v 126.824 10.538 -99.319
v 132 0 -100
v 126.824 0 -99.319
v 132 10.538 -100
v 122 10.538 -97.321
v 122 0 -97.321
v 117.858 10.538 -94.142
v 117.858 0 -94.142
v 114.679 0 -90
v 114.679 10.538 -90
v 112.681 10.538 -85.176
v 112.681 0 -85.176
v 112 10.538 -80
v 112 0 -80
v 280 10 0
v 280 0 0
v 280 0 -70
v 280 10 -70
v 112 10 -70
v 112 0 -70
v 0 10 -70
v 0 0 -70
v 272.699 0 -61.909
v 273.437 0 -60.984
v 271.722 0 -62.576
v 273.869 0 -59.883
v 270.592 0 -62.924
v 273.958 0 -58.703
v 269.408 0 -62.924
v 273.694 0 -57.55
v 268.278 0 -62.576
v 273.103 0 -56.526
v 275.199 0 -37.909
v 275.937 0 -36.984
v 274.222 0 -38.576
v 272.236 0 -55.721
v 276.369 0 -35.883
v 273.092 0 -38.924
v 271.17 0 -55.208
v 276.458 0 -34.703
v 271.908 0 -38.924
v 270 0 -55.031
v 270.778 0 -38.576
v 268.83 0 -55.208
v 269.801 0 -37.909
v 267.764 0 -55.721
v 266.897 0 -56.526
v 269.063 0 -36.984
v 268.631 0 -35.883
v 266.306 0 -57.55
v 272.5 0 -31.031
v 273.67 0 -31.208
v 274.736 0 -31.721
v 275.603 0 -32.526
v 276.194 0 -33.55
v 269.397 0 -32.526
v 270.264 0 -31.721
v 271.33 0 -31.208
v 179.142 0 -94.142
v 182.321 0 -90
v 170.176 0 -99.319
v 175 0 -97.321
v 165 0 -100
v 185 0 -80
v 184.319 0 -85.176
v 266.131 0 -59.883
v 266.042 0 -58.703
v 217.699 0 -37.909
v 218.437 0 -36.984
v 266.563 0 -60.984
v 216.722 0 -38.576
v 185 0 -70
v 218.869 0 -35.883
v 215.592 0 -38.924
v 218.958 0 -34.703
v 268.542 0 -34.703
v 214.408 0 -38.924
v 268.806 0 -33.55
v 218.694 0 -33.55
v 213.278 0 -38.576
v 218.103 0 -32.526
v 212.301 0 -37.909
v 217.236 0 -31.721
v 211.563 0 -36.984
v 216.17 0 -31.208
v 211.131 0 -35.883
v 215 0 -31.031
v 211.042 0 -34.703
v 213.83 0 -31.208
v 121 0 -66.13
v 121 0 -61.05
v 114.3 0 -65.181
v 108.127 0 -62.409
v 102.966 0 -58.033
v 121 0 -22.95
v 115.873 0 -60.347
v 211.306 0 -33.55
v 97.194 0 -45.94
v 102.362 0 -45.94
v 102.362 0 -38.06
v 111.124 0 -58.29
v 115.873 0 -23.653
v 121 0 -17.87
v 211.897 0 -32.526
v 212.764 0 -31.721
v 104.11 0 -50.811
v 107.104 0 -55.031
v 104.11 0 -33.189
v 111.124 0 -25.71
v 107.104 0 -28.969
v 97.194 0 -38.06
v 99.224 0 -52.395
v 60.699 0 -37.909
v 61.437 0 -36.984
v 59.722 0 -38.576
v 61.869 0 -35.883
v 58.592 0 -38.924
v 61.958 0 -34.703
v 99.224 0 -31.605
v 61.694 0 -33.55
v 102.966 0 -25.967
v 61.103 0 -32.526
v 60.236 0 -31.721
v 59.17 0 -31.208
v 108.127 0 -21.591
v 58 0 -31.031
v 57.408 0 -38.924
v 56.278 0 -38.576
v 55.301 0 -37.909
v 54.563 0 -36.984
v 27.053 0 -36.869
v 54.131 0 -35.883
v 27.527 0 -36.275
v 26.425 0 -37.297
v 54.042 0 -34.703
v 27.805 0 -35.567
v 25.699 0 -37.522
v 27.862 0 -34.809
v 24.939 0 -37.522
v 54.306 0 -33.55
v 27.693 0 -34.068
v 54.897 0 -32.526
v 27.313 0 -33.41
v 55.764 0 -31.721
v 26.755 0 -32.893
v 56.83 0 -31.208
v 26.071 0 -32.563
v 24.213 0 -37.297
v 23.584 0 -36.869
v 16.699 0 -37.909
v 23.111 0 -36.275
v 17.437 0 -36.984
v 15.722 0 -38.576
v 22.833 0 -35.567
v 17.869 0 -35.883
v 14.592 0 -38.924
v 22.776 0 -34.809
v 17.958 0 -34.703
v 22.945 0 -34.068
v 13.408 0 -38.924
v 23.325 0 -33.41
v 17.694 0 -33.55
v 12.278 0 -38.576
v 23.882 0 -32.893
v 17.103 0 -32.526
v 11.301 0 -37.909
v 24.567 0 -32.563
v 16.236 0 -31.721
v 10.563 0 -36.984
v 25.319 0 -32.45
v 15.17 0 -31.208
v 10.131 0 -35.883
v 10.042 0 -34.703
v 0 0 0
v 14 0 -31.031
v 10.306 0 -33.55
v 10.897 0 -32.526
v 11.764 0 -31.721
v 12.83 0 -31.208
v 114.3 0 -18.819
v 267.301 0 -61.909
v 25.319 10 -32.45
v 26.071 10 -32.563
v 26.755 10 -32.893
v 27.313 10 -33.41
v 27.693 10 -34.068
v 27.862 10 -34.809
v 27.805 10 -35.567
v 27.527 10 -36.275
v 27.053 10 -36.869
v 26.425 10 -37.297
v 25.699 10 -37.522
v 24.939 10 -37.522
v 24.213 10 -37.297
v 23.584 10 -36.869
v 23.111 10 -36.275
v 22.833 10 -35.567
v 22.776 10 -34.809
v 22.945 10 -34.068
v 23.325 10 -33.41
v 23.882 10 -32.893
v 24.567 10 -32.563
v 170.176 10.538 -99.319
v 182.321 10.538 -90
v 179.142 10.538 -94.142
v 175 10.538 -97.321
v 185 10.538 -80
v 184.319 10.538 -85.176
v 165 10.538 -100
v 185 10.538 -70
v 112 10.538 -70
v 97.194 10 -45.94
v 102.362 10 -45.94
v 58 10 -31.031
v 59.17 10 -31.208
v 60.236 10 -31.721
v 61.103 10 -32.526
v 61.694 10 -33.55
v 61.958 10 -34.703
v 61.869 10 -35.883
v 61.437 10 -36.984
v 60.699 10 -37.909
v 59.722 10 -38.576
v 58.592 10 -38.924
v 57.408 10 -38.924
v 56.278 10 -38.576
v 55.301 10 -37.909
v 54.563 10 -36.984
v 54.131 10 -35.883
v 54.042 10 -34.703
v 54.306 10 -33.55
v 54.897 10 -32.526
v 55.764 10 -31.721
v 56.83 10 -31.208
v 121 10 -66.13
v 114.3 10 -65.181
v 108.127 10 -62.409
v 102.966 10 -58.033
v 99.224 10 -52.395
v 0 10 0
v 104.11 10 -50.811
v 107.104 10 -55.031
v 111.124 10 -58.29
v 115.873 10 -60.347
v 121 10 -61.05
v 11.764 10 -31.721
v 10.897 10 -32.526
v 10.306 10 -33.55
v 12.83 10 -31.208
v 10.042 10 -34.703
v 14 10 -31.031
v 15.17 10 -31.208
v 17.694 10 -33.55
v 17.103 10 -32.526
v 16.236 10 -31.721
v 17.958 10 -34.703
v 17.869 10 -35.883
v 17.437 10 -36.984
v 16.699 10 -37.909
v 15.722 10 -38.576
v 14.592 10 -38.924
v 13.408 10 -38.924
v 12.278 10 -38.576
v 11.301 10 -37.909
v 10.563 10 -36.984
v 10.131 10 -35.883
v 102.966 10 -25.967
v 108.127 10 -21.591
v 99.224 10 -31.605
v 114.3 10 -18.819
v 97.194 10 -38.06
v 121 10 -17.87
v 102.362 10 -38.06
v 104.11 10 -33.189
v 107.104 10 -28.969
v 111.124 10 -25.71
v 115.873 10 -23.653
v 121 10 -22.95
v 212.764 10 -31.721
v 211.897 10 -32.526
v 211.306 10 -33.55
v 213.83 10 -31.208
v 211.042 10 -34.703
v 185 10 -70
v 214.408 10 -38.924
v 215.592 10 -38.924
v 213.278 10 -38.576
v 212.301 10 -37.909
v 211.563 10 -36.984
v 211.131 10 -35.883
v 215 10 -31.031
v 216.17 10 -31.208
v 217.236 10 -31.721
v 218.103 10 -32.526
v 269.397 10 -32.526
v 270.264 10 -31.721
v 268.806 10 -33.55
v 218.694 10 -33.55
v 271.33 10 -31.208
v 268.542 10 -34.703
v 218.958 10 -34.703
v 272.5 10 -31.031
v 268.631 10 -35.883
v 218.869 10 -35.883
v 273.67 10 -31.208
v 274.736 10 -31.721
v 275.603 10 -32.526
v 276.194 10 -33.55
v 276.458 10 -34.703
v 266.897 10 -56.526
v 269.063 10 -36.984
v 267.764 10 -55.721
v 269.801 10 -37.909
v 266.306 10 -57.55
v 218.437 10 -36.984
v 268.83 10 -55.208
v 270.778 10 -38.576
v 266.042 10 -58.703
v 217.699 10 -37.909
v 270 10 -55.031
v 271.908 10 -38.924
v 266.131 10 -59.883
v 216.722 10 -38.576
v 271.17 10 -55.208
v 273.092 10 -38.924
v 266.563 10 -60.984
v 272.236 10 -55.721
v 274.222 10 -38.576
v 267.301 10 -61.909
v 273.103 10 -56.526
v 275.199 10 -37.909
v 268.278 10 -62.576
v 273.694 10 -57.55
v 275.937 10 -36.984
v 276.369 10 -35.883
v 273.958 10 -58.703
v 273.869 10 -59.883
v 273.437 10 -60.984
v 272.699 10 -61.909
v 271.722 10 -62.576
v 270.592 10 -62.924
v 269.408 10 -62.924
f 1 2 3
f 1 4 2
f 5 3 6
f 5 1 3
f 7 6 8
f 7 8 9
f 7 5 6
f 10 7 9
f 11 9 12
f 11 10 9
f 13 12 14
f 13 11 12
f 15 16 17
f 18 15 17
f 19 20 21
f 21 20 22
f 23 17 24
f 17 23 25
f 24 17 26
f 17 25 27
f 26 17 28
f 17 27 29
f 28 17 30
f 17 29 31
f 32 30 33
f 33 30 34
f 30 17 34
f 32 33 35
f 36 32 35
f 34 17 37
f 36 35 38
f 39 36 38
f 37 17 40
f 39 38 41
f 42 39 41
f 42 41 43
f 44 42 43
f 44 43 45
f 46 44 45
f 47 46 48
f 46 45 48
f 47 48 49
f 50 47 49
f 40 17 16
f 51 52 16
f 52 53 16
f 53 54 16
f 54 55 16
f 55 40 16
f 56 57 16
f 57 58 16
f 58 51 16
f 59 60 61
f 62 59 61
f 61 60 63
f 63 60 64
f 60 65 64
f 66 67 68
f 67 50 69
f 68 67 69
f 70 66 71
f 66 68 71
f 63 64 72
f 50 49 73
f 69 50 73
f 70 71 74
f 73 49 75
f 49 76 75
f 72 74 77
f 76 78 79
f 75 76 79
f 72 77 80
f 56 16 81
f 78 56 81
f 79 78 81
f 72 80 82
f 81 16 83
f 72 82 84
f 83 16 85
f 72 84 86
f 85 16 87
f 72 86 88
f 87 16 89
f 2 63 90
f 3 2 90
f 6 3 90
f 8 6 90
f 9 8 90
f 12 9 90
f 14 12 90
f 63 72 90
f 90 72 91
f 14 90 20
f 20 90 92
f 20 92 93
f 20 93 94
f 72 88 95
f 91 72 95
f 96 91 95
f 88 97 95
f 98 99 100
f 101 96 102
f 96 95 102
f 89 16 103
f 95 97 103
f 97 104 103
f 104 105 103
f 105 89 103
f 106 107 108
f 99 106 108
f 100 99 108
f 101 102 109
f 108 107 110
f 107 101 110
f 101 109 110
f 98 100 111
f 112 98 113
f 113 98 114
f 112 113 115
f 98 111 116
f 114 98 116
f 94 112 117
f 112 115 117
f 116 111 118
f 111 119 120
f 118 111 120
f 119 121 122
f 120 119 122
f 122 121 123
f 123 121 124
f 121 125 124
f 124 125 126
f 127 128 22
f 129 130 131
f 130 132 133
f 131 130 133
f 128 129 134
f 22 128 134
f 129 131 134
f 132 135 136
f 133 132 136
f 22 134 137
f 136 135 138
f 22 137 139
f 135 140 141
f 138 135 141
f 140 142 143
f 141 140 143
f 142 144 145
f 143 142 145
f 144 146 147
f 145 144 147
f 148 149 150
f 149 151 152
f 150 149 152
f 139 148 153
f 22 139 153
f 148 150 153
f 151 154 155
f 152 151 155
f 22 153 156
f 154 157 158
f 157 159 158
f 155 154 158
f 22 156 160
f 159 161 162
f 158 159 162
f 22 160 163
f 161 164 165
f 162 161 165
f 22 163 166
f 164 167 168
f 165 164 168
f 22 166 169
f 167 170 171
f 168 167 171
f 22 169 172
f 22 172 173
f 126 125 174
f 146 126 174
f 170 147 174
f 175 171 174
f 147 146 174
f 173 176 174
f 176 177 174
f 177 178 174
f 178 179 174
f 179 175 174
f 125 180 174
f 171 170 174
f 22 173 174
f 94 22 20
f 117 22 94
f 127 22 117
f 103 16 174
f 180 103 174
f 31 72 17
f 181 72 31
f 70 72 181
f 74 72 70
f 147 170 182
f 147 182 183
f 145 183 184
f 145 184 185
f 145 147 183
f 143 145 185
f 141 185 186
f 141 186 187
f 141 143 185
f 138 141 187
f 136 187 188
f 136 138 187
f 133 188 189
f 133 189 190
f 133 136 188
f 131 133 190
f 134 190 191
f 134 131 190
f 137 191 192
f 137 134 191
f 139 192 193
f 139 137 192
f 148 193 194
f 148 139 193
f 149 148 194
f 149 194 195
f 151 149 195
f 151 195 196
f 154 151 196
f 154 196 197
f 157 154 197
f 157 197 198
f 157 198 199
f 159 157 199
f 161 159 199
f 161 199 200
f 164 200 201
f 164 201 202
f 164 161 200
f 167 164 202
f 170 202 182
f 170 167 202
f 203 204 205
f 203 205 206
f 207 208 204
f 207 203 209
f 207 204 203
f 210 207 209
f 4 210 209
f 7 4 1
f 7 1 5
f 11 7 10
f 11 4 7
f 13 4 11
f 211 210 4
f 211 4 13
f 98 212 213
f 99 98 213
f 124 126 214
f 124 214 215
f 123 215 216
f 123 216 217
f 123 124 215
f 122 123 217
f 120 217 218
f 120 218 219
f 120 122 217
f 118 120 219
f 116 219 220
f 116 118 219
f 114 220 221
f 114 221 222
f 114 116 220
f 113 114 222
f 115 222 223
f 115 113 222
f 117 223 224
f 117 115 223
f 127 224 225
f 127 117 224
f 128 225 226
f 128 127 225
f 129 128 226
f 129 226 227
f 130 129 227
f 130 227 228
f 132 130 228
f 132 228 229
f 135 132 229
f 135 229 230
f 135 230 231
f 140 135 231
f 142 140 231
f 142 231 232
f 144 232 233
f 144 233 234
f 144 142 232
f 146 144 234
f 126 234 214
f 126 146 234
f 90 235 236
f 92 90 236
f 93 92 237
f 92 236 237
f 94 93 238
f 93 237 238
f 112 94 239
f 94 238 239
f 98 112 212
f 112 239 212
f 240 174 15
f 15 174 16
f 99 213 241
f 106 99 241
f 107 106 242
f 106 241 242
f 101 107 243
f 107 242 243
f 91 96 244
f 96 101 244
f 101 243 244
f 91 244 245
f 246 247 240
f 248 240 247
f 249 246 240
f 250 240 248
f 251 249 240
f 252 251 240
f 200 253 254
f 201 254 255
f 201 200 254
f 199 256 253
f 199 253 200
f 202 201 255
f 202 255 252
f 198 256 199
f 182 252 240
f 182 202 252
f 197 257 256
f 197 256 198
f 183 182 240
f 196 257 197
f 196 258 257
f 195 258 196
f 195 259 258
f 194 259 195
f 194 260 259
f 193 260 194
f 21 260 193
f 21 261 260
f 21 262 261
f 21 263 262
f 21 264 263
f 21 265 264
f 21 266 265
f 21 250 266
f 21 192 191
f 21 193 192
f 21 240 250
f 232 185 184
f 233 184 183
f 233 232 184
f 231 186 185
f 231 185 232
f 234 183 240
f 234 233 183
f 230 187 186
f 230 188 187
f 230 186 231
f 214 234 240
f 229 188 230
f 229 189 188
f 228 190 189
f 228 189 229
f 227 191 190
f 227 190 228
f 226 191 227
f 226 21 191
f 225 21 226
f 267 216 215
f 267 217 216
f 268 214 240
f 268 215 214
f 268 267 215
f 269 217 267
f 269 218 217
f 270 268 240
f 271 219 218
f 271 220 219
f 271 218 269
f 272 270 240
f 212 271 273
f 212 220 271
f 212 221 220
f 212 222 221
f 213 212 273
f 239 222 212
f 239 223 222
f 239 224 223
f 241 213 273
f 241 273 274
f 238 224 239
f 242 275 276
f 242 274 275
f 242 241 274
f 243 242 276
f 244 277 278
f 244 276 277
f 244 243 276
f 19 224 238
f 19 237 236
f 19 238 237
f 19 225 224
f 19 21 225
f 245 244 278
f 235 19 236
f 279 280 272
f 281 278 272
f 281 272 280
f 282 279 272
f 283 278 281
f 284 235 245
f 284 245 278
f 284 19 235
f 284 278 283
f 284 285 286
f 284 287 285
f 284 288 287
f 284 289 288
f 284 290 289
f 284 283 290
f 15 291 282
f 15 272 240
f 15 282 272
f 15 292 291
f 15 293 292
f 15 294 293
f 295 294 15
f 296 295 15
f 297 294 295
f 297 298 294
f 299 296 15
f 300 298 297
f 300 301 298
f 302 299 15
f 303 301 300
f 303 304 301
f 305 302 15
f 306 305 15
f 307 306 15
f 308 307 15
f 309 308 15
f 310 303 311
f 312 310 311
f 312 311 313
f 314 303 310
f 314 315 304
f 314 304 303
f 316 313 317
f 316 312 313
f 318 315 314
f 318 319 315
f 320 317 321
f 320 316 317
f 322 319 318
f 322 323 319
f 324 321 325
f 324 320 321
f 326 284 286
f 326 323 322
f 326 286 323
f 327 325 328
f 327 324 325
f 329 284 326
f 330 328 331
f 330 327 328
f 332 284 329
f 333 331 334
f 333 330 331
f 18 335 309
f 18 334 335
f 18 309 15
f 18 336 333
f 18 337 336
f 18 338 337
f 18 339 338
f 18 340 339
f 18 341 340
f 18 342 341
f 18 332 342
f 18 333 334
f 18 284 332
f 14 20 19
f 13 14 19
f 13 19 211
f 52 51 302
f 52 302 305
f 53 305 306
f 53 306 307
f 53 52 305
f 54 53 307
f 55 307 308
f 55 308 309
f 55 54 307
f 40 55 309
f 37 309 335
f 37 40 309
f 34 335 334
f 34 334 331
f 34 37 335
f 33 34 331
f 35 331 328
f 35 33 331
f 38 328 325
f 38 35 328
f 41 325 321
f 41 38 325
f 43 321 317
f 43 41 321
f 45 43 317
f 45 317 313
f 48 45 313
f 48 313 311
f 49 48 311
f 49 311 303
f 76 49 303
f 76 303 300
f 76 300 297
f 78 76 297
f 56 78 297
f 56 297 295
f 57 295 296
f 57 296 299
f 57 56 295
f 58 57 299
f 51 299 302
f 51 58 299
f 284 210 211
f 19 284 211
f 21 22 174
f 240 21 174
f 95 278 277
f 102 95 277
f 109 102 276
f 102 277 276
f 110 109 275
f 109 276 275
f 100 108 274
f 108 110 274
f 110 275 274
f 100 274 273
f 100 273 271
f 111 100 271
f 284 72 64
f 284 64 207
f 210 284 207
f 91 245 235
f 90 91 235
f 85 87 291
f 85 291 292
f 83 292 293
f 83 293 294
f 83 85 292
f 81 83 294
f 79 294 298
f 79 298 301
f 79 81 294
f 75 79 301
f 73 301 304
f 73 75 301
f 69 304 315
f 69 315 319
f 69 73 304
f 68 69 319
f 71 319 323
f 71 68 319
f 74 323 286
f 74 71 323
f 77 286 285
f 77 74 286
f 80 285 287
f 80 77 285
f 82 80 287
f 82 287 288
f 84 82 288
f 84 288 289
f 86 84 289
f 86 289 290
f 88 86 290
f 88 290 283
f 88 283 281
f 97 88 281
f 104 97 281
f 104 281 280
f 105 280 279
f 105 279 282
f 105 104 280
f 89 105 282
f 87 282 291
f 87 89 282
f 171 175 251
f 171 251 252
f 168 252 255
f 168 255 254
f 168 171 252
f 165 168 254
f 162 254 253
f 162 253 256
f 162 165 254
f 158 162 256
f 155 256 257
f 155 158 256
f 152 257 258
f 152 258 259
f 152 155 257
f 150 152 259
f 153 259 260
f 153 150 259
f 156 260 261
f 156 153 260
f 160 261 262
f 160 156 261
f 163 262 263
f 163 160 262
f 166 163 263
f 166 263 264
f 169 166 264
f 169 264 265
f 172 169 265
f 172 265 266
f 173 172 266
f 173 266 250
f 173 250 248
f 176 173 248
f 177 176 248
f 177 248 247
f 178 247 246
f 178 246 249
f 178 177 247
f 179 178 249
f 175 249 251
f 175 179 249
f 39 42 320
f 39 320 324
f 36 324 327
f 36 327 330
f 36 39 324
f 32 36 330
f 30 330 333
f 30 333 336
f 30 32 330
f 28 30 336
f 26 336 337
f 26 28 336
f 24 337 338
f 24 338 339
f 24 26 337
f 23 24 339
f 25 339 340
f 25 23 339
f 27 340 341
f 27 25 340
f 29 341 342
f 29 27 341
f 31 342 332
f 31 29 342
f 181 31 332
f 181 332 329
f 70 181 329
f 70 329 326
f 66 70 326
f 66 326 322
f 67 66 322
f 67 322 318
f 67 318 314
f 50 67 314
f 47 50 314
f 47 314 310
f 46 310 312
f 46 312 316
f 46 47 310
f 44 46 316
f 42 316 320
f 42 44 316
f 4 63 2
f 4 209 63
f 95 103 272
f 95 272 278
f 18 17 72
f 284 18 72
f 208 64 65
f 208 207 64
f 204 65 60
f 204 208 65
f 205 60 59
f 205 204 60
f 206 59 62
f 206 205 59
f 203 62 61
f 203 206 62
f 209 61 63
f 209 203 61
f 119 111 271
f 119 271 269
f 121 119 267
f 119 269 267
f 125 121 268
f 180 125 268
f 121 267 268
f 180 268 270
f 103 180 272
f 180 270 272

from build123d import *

# Parameters (mm, degrees)
SKETCH1_W           = 280
SKETCH1_H           = 70
SKETCH1_R           = 3.96875
SKETCH1_R_2         = 2.55
BOSS_EXTRUDE7_DEPTH = 10
SKETCH2_W           = 73
SKETCH2_H           = 10.538321467
BOSS_EXTRUDE8_DEPTH = 30
FILLET3_R           = 20
FILLET4_R           = 20
CUT_EXTRUDE1_DEPTH  = 298.489495613
CUT_EXTRUDE2_DEPTH  = 298.489495613


with BuildPart() as part:
    # Sketch1 → Boss-Extrude7 (new body)
    with BuildSketch(Plane(origin=(0, 0, 0), x_dir=(1, 0, 0), z_dir=(0, 1, 0))):
        with Locations((140, 35)):
            Rectangle(SKETCH1_W, SKETCH1_H)
        with Locations((14, 35)):
            Circle(SKETCH1_R, mode=Mode.SUBTRACT)
        with Locations((25.318924397, 35)):
            Circle(SKETCH1_R_2, mode=Mode.SUBTRACT)
        with Locations((58, 35)):
            Circle(SKETCH1_R, mode=Mode.SUBTRACT)
        with Locations((215, 35)):
            Circle(SKETCH1_R, mode=Mode.SUBTRACT)
        with Locations((272.5, 35)):
            Circle(SKETCH1_R, mode=Mode.SUBTRACT)
        with Locations((270, 59)):
            Circle(SKETCH1_R, mode=Mode.SUBTRACT)
    extrude(amount=BOSS_EXTRUDE7_DEPTH)

    # Sketch2 → Boss-Extrude8 (add)
    with BuildSketch(Plane(origin=(0, 0, -70), x_dir=(-1, 0, 0), z_dir=(0, 0, -1))):
        with Locations((-148.5, 5.269160734)):
            Rectangle(SKETCH2_W, SKETCH2_H)
    extrude(amount=BOSS_EXTRUDE8_DEPTH)

    # Fillet3
    fillet3_edges = [part.edges().sort_by_distance(p)[0] for p in [
        (185, 5.269160734, -100),
    ]]
    fillet(fillet3_edges, radius=FILLET3_R)

    # Fillet4
    fillet4_edges = [part.edges().sort_by_distance(p)[0] for p in [
        (112, 5.269160734, -100),
    ]]
    fillet(fillet4_edges, radius=FILLET4_R)

    # Sketch3 → Cut-Extrude1 (cut, through all)
    with BuildSketch(Plane(origin=(0, 10, 0), x_dir=(1, 0, 0), z_dir=(0, 1, 0))):
        with BuildLine():
            Line((121, 61.05), (121, 66.13))
            ThreePointArc((121, 66.13), (105.392513422, 60.402805839), (97.193821375, 45.939893305))
            Line((97.193821375, 45.939893305), (102.361874001, 45.939893305))
            ThreePointArc((102.361874001, 45.939893305), (109.003176826, 56.797930049), (121, 61.05))
        make_face()
    extrude(amount=-CUT_EXTRUDE1_DEPTH, mode=Mode.SUBTRACT)

    # Sketch3<3> → Cut-Extrude2 (cut, through all)
    with BuildSketch(Plane(origin=(0, 10, 0), x_dir=(1, 0, 0), z_dir=(0, 1, 0))):
        with BuildLine():
            Line((121, 17.87), (121, 22.95))
            ThreePointArc((121, 22.95), (109.003176826, 27.202069951), (102.361874001, 38.060106695))
            Line((102.361874001, 38.060106695), (97.193821375, 38.060106695))
            ThreePointArc((97.193821375, 38.060106695), (105.392513422, 23.597194161), (121, 17.87))
        make_face()
    extrude(amount=-CUT_EXTRUDE2_DEPTH, mode=Mode.SUBTRACT)


solid = part.part
